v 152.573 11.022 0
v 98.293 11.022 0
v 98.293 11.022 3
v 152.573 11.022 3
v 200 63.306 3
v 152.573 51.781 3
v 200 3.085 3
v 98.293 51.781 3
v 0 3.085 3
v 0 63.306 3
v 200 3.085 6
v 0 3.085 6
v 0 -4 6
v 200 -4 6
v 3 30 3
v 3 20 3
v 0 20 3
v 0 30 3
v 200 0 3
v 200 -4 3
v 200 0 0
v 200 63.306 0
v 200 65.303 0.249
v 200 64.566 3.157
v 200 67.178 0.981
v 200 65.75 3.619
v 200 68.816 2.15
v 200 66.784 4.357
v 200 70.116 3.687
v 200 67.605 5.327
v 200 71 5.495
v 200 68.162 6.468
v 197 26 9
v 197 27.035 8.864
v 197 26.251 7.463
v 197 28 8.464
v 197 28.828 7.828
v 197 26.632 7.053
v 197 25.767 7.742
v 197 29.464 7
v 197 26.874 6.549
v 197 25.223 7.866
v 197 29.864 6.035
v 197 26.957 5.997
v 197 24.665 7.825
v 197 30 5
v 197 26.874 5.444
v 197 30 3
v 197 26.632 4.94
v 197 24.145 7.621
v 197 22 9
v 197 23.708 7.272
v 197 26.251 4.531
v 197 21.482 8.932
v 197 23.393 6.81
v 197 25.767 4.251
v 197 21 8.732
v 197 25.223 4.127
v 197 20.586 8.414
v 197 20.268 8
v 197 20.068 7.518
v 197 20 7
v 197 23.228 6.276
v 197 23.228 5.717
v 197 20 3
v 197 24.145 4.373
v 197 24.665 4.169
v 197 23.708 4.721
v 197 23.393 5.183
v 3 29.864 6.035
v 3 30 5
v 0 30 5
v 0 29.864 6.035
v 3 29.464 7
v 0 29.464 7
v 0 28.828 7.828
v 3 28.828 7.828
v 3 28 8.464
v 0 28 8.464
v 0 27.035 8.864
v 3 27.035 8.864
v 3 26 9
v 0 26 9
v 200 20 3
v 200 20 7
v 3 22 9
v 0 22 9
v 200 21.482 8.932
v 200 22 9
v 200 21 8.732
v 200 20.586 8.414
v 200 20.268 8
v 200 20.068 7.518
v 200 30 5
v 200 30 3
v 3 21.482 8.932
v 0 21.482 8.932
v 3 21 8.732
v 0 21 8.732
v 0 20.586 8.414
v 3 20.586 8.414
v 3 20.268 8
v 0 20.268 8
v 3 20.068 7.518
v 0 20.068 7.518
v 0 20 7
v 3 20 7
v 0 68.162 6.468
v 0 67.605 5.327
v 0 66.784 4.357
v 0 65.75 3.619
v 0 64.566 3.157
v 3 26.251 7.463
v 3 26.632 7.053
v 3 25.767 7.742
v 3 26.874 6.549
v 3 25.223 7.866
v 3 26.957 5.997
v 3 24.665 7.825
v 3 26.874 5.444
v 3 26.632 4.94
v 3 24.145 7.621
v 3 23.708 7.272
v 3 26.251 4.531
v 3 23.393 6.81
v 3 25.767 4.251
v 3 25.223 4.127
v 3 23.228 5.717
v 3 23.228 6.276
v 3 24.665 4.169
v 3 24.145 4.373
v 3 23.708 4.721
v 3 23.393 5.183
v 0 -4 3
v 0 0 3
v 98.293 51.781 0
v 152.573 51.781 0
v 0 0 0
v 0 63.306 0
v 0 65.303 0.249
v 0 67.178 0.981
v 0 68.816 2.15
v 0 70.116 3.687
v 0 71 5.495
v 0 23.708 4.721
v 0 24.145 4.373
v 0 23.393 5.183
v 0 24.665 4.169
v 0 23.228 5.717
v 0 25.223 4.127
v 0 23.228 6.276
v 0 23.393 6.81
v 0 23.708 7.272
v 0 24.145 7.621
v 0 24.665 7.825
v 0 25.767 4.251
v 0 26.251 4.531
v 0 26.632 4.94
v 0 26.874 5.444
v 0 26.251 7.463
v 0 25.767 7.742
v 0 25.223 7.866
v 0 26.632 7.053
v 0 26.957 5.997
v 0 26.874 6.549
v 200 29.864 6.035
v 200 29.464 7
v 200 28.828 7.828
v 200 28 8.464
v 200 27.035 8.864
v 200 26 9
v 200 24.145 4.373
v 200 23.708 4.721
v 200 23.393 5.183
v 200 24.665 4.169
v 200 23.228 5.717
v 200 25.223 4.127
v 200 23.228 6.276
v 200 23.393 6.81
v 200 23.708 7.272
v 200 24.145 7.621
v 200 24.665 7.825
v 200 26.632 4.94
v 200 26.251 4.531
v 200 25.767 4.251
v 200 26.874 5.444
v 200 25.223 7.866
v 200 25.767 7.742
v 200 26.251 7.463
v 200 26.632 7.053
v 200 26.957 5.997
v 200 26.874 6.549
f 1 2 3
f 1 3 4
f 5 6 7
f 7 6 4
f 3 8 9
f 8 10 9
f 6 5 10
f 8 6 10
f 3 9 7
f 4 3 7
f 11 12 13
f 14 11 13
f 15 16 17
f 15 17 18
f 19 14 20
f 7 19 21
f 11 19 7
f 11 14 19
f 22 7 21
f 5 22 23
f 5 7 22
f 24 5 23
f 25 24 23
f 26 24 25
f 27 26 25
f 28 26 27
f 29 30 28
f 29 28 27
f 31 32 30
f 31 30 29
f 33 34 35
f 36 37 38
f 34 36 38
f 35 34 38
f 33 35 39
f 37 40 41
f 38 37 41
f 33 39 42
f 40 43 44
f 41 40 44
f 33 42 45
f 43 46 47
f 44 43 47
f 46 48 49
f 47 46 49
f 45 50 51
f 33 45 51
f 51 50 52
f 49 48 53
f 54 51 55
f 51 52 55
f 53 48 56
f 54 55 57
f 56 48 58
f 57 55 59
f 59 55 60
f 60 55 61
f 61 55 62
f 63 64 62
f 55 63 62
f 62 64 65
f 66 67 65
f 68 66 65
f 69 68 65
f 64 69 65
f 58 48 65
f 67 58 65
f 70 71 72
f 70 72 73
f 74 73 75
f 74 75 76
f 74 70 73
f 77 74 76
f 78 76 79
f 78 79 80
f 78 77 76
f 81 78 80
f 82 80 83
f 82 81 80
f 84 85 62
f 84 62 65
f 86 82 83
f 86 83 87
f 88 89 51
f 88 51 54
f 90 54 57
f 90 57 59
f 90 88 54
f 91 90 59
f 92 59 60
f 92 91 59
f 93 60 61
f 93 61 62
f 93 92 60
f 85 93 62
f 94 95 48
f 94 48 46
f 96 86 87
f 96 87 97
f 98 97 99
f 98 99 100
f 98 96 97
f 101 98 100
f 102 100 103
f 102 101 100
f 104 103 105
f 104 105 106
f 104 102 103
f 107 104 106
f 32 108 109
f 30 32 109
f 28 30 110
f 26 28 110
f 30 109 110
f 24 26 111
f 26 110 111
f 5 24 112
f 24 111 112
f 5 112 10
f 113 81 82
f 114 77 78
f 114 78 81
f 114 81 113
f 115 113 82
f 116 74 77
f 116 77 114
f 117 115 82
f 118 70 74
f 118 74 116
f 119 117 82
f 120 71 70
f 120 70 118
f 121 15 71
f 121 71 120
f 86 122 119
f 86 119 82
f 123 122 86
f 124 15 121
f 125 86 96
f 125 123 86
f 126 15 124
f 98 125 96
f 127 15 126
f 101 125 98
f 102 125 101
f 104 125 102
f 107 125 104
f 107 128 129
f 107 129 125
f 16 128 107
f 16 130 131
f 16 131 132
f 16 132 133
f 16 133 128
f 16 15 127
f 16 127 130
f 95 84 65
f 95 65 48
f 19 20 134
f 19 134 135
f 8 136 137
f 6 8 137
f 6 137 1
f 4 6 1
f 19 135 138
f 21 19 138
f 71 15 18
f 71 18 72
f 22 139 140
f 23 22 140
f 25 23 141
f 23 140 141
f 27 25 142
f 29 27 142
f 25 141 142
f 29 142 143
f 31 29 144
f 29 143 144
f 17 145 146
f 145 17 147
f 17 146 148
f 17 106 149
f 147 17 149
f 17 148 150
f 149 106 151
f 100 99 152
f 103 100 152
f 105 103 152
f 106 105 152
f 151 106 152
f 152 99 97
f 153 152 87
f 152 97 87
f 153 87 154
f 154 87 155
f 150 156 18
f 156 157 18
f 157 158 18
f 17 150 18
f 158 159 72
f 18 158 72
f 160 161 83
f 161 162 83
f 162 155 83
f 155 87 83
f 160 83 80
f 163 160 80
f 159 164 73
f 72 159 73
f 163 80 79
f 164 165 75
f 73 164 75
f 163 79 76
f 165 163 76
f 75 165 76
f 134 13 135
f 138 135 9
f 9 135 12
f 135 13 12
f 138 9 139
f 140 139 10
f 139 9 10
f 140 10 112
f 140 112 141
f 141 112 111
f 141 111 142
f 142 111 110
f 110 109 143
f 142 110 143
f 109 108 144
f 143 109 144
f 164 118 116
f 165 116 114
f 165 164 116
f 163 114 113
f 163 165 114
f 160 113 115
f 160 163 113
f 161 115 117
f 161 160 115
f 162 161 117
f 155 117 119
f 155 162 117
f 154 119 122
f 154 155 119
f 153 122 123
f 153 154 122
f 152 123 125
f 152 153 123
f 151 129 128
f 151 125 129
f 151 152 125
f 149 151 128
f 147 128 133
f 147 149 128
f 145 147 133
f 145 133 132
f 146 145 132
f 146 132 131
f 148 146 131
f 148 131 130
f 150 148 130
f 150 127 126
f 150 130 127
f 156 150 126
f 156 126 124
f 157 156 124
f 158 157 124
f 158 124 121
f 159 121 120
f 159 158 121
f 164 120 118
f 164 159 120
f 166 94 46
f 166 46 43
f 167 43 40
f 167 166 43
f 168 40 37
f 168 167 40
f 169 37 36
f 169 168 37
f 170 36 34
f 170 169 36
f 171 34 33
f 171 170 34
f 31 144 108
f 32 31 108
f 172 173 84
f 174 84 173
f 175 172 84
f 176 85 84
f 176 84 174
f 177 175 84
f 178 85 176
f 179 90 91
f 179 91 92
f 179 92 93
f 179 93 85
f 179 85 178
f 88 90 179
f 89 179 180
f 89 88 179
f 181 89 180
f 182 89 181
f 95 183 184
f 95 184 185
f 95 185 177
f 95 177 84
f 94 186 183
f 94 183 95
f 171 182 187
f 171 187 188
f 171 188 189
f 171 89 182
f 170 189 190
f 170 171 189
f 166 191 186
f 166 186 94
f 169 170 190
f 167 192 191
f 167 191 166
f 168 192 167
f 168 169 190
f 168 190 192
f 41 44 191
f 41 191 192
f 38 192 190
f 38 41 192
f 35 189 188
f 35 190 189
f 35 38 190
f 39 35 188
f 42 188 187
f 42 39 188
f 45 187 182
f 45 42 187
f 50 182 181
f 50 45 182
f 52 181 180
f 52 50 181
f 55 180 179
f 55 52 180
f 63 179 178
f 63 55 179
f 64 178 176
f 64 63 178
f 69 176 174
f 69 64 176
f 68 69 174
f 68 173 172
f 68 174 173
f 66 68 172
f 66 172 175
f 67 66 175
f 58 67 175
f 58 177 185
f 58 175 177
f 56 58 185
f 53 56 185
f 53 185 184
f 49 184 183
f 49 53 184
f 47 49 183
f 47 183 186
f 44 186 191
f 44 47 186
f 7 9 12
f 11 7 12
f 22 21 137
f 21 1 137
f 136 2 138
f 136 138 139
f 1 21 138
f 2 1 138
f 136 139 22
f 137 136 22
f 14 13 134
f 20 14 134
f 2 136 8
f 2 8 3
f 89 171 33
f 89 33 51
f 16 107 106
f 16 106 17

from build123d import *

# Parameters (mm, degrees)
F1_DEPTH = 200
F4_DEPTH = 200
F3_R     = 1.875
F5_DEPTH = 200.001
F6_W     = 194
F6_H     = 10
F7_DEPTH = 25
F8_W     = 54.280467
F8_H     = 40.758641
F9_DEPTH = 9.001


with BuildPart() as f1:
    # F0 (on Right) → F1 (new body)
    with BuildSketch(Plane.YZ):
        with BuildLine():
            Line((63.305819, 3), (3.084723, 3))
            Line((3.084723, 3), (3.084723, 6))
            Line((3.084723, 6), (-4, 6))
            Line((-4, 6), (-4, 3))
            Line((-4, 3), (0, 3))
            Line((0, 3), (0, 0))
            Line((0, 0), (63.305819, 0))
            ThreePointArc((63.305819, 0), (68.033242, 1.514758), (71, 5.49488))
            Line((71, 5.49488), (68.162324, 6.468324))
            ThreePointArc((68.162324, 6.468324), (66.28973, 3.956103), (63.305819, 3))
        make_face()
    extrude(amount=F1_DEPTH)

    # F8 (on face) → F9 (cut, through all)
    with BuildSketch(Plane(origin=(0, 0, 0), x_dir=(1, 0, 0), z_dir=(0, 0, -1))):
        with Locations((125.433217, -31.4017)):
            Rectangle(F8_W, F8_H)
    extrude(amount=-F9_DEPTH, mode=Mode.SUBTRACT)


with BuildPart() as f4:
    # F2 (on face) → F4 (new body)
    with BuildSketch(Plane.YZ.offset(200)):
        with BuildLine():
            Line((20, 7), (20, 3))
            Line((20, 3), (30, 3))
            Line((30, 3), (30, 5))
            ThreePointArc((30, 5), (28.828427, 7.828427), (26, 9))
            Line((26, 9), (22, 9))
            ThreePointArc((22, 9), (20.585786, 8.414214), (20, 7))
        make_face()
    extrude(amount=-F4_DEPTH)

    # F3 (on Right) → F5 (cut, through all)
    with BuildSketch(Plane.YZ):
        with Locations((25.082385, 5.996722)):
            Circle(F3_R)
    extrude(amount=F5_DEPTH, mode=Mode.SUBTRACT)

    # F6 (on face) → F7 (cut)
    with BuildSketch(Plane(origin=(0, 0, 3), x_dir=(1, 0, 0), z_dir=(0, 0, -1))):
        with Locations((100, -25)):
            Rectangle(F6_W, F6_H)
    extrude(amount=-F7_DEPTH, mode=Mode.SUBTRACT)


solid = Compound([f1.part, f4.part])
